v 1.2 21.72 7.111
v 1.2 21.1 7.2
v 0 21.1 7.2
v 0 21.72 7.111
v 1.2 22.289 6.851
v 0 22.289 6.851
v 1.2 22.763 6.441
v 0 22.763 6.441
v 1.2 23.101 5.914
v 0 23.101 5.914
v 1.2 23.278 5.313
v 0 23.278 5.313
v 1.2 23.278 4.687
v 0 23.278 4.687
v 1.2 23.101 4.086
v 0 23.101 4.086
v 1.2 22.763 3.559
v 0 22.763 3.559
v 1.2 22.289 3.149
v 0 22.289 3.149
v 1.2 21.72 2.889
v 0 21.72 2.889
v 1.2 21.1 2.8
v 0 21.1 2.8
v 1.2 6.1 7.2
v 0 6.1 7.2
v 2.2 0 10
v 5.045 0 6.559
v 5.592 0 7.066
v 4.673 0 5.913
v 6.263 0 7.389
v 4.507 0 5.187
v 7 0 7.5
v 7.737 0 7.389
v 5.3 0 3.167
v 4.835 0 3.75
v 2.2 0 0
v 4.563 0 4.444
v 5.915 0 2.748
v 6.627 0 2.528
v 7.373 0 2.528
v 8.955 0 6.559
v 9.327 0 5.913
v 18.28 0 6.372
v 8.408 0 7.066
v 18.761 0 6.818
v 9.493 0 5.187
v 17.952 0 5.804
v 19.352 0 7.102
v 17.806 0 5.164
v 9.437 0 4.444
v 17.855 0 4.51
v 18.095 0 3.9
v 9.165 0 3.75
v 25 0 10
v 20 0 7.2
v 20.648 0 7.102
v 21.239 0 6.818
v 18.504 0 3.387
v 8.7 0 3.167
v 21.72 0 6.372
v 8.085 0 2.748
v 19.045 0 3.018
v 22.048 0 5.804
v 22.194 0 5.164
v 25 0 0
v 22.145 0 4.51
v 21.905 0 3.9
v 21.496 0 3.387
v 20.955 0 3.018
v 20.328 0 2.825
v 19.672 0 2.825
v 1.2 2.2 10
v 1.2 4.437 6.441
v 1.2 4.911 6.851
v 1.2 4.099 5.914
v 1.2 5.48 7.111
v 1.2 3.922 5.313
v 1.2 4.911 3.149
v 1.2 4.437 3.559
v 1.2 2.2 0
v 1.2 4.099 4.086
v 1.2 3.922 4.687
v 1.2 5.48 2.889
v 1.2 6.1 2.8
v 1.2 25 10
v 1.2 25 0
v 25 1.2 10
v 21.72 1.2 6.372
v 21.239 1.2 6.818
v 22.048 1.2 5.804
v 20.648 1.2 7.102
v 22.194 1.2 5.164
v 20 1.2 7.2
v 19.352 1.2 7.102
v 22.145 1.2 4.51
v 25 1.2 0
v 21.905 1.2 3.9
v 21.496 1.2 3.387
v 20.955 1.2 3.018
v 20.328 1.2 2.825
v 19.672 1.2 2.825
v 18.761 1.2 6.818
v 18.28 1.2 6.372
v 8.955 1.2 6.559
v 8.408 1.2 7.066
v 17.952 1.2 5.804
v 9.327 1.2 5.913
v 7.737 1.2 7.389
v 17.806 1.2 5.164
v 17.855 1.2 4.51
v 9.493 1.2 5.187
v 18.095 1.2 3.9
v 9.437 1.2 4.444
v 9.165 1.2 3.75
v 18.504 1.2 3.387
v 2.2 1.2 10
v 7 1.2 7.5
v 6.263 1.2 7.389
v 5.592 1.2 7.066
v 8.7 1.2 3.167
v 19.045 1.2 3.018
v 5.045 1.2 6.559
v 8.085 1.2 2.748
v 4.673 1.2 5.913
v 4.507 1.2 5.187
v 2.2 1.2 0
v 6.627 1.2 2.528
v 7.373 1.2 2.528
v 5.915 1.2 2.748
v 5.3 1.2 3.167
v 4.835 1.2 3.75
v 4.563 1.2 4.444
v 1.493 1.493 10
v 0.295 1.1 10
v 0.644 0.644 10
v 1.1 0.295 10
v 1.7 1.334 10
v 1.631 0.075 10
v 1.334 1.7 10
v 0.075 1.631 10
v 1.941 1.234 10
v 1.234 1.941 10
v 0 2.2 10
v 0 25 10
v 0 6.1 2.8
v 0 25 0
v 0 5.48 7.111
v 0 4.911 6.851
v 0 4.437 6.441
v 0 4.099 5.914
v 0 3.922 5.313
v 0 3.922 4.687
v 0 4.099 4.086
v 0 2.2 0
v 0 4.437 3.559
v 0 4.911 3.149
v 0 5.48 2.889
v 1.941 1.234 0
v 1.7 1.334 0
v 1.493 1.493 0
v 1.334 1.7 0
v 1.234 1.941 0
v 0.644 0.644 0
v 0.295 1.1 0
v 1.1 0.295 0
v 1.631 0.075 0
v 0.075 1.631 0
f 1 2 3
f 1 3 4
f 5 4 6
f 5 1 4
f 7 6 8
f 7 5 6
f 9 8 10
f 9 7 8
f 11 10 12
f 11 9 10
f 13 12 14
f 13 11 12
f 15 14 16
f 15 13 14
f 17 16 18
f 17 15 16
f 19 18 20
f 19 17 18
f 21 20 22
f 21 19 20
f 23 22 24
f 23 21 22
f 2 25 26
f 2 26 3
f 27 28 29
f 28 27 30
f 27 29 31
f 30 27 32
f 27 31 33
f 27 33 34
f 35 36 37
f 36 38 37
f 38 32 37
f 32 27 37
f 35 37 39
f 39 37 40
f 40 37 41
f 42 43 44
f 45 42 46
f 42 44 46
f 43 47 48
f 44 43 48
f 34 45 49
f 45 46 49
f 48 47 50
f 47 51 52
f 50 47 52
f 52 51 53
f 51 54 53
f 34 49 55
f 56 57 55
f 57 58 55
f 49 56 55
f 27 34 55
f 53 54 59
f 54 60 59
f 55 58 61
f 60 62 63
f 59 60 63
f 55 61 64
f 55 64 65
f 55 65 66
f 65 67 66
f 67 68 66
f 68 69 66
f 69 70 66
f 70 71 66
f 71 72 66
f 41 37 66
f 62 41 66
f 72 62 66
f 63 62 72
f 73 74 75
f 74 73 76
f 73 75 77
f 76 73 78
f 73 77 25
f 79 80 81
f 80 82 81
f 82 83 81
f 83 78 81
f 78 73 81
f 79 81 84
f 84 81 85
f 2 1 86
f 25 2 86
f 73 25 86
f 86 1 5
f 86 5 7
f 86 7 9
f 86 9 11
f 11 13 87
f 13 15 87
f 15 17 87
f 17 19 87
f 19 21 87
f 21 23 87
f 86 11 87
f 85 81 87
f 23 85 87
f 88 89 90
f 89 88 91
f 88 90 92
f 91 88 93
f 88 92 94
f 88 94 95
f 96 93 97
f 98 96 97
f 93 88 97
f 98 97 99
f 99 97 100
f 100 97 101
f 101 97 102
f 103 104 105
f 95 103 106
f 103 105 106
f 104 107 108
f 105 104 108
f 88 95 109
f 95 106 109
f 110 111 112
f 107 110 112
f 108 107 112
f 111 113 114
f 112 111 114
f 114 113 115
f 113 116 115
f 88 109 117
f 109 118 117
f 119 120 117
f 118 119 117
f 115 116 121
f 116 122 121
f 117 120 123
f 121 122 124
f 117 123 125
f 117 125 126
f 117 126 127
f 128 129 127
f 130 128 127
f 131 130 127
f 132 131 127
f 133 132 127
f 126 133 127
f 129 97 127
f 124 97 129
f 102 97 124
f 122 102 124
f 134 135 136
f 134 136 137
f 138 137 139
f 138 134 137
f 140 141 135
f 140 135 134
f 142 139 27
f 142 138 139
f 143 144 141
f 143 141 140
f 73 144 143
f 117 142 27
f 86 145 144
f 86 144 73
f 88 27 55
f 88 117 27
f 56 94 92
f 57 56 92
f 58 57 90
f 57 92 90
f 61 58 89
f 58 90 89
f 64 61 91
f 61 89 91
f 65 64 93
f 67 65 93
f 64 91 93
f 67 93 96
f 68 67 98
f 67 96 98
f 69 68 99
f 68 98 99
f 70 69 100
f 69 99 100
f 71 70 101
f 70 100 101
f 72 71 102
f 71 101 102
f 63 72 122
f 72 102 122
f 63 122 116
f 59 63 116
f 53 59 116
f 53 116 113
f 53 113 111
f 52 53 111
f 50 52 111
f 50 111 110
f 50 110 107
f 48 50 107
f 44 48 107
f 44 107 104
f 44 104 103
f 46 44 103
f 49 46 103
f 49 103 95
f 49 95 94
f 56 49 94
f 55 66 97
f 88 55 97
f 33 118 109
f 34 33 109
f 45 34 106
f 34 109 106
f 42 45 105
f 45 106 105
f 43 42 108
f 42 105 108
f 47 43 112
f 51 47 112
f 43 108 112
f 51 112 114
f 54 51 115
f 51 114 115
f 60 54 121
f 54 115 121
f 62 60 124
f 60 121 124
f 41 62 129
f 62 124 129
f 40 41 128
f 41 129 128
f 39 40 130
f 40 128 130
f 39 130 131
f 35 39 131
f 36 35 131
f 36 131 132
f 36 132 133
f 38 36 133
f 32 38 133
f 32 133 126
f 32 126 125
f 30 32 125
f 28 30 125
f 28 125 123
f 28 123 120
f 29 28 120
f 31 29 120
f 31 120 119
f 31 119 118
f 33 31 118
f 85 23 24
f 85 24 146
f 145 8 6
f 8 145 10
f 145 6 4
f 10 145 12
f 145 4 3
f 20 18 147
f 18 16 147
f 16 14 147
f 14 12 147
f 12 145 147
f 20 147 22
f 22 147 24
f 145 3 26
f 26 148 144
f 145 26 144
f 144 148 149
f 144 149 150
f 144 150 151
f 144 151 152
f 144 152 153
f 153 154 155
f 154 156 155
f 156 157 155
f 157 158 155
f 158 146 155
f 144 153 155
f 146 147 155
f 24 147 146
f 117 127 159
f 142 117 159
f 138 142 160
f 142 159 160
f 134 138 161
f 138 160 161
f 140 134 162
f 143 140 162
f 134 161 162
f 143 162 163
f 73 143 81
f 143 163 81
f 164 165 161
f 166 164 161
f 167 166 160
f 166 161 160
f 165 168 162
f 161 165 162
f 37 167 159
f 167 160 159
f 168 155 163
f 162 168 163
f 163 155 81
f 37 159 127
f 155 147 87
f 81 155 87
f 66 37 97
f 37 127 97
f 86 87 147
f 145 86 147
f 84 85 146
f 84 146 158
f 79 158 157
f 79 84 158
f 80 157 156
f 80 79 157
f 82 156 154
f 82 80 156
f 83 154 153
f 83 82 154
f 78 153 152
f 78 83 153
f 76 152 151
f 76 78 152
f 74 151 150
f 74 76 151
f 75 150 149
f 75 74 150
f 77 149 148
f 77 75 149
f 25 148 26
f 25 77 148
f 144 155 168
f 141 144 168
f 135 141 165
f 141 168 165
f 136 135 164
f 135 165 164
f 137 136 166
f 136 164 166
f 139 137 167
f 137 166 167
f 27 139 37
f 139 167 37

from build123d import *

# Parameters (mm, degrees)
T_LE_DE_BASE_PLI_E1_DEPTH = 10
ENL_V_MAT_EXTRU_1_REACH   = 37.937
ESQUISSE6_R               = 2.2
ESQUISSE6_R_2             = 2.5
ENL_V_MAT_EXTRU_2_REACH   = 37.937


# Sheet-metal steps are written as plain solids
with BuildPart() as part:
    # Esquisse1 → Tôle de base pliée1 (new body)
    with BuildSketch(Plane.XY):
        with BuildLine():
            Line((0, 25), (0, 2.2))
            ThreePointArc((0, 2.2), (0.644365081, 0.644365081), (2.2, 0))
            Line((2.2, 0), (25, 0))
            Line((25, 0), (25, 1.2))
            Line((25, 1.2), (2.2, 1.2))
            ThreePointArc((2.2, 1.2), (1.492893219, 1.492893219), (1.2, 2.2))
            Line((1.2, 2.2), (1.2, 25))
            Line((1.2, 25), (0, 25))
        make_face()
    extrude(amount=T_LE_DE_BASE_PLI_E1_DEPTH)

    # Esquisse6 → Enlèv. mat.-Extru.1 (cut, up to next)
    with BuildSketch(Plane(origin=(0, 1.2, 0), x_dir=(1, 0, 0), z_dir=(0, 1, 0)), mode=Mode.PRIVATE) as enl_v_mat_extru_1_sk1:
        with Locations(Location((20, -5, 0), (0, 0, 270))):
            Circle(ESQUISSE6_R)
    enl_v_mat_extru_1_tool1 = extrude(enl_v_mat_extru_1_sk1.sketch, amount=-ENL_V_MAT_EXTRU_1_REACH, mode=Mode.PRIVATE) & part.part
    # Esquisse6 → Enlèv. mat.-Extru.1 (cut, up to next)
    with BuildSketch(Plane(origin=(0, 1.2, 0), x_dir=(1, 0, 0), z_dir=(0, 1, 0)), mode=Mode.PRIVATE) as enl_v_mat_extru_1_sk2:
        with Locations(Location((7, -5, 0), (0, 0, 270))):
            Circle(ESQUISSE6_R_2)
    enl_v_mat_extru_1_tool2 = extrude(enl_v_mat_extru_1_sk2.sketch, amount=-ENL_V_MAT_EXTRU_1_REACH, mode=Mode.PRIVATE) & part.part
    add(enl_v_mat_extru_1_tool1.solids().sort_by_distance((20, 1.2, 5))[0], mode=Mode.SUBTRACT)
    add(enl_v_mat_extru_1_tool2.solids().sort_by_distance((7, 1.2, 5))[0], mode=Mode.SUBTRACT)

    # Esquisse7 → Enlèv. mat.-Extru.2 (cut, up to next)
    with BuildSketch(Plane(origin=(1.2, 0, 0), x_dir=(0, 0, -1), z_dir=(1, 0, 0)), mode=Mode.PRIVATE) as enl_v_mat_extru_2_sk1:
        with BuildLine():
            Line((-2.8, 21.1), (-2.8, 6.1))
            ThreePointArc((-2.8, 6.1), (-5, 3.9), (-7.2, 6.1))
            Line((-7.2, 6.1), (-7.2, 21.1))
            ThreePointArc((-7.2, 21.1), (-5, 23.3), (-2.8, 21.1))
        make_face()
    enl_v_mat_extru_2_tool1 = extrude(enl_v_mat_extru_2_sk1.sketch, amount=-ENL_V_MAT_EXTRU_2_REACH, mode=Mode.PRIVATE) & part.part
    add(enl_v_mat_extru_2_tool1.solids().sort_by_distance((1.2, 13.6, 5))[0], mode=Mode.SUBTRACT)


solid = part.part
